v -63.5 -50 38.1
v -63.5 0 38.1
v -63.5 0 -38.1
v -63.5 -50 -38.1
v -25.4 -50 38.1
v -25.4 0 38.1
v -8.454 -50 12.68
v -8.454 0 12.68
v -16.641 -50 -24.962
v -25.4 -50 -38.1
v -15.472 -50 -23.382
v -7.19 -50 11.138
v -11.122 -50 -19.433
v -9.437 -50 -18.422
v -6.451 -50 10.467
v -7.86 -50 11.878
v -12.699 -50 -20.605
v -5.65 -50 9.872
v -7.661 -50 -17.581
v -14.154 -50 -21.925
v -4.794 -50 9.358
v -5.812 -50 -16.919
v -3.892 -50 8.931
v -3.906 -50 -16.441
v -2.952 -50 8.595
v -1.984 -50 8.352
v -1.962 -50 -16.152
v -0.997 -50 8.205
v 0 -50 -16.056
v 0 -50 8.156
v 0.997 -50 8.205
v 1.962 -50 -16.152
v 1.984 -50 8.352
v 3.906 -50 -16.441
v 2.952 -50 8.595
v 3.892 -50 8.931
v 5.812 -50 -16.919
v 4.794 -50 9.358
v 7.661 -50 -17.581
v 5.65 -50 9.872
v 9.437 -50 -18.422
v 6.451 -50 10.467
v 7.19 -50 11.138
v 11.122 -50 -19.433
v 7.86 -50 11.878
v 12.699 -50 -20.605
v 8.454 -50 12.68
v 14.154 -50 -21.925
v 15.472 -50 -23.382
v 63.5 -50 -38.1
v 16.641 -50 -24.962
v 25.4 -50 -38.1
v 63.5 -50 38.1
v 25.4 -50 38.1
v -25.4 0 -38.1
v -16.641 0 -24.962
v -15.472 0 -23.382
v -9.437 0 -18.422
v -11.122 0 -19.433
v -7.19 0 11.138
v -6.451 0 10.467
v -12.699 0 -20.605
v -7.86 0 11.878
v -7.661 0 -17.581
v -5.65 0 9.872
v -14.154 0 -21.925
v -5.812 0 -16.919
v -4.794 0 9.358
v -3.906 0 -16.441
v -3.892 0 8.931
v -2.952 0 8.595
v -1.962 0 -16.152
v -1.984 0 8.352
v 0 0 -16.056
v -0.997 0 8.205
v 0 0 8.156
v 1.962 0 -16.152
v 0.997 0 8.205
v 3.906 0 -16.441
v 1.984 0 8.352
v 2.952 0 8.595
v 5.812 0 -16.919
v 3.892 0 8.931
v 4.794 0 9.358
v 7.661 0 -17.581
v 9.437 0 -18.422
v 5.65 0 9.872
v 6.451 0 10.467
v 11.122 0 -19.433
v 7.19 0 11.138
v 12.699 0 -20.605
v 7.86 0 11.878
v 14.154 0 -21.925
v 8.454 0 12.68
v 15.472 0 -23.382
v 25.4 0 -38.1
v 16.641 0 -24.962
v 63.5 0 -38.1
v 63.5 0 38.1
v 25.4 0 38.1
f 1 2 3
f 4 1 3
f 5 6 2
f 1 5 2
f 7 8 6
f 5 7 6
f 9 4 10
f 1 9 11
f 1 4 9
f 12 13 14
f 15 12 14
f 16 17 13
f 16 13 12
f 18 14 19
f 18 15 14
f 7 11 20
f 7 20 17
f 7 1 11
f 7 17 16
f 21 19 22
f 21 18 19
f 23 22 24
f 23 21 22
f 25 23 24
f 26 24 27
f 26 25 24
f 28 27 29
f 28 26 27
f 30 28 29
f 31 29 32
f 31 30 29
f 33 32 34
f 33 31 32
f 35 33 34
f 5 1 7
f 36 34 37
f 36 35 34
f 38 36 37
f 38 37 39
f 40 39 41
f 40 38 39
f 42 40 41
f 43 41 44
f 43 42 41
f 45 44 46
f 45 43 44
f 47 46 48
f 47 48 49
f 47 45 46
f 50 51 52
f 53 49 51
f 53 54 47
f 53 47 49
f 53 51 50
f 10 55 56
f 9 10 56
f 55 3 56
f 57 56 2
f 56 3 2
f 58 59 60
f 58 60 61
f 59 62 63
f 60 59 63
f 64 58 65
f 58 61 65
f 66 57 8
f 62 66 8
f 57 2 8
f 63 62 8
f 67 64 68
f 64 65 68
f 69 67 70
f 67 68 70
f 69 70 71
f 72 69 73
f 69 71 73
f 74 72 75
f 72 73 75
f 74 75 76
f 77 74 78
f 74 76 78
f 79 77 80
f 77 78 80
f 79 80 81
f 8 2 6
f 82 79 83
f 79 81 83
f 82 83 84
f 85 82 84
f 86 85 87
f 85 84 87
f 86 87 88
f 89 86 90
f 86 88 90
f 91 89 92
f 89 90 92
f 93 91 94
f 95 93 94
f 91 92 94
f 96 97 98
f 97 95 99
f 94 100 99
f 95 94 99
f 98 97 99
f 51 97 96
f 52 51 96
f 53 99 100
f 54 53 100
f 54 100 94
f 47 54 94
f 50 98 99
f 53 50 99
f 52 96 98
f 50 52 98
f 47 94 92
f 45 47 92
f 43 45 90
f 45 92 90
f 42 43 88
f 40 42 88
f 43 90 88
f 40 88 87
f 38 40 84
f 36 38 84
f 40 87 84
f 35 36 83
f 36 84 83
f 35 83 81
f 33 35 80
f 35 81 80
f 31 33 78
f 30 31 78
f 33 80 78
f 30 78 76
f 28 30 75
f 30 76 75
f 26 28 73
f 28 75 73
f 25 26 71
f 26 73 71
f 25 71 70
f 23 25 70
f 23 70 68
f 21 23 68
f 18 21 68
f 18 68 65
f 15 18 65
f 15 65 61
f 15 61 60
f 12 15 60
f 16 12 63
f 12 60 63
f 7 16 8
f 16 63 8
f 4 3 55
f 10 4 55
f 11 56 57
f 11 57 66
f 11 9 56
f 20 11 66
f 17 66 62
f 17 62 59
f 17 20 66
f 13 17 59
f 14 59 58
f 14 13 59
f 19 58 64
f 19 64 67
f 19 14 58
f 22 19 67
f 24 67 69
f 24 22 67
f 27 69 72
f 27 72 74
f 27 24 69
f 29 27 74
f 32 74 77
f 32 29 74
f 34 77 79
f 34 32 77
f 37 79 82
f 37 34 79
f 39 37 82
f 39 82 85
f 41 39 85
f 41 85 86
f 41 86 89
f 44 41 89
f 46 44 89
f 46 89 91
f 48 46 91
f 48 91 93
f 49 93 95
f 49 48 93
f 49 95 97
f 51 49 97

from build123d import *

# Parameters (mm, degrees)
F1_DEPTH = 50
F2_R     = 20


with BuildPart() as f1:
    # F0 (on Front) → F1 (new body)
    with BuildSketch(Plane.XZ):
        with BuildLine():
            Line((-63.5, 38.1), (-63.5, 0))
            Line((-63.5, 0), (-63.5, -38.1))
            Line((-63.5, -38.1), (-25.4, -38.1))
            Line((-25.4, -38.1), (0, 0))
            Line((0, 0), (25.4, -38.1))
            Line((25.4, -38.1), (63.5, -38.1))
            Line((63.5, -38.1), (63.5, 0))
            Line((63.5, 0), (63.5, 38.1))
            Line((63.5, 38.1), (25.4, 38.1))
            Line((25.4, 38.1), (8.453631, 12.680446))
            ThreePointArc((8.453631, 12.680446), (0, 8.1562), (-8.453631, 12.680446))
            Line((-8.453631, 12.680446), (-25.4, 38.1))
            Line((-25.4, 38.1), (-63.5, 38.1))
        make_face()
    extrude(amount=F1_DEPTH)

    # F2
    f2_edges = [f1.edges().sort_by_distance(p)[0] for p in [
        (0, -25, 0),
    ]]
    fillet(f2_edges, radius=F2_R)


solid = f1.part
